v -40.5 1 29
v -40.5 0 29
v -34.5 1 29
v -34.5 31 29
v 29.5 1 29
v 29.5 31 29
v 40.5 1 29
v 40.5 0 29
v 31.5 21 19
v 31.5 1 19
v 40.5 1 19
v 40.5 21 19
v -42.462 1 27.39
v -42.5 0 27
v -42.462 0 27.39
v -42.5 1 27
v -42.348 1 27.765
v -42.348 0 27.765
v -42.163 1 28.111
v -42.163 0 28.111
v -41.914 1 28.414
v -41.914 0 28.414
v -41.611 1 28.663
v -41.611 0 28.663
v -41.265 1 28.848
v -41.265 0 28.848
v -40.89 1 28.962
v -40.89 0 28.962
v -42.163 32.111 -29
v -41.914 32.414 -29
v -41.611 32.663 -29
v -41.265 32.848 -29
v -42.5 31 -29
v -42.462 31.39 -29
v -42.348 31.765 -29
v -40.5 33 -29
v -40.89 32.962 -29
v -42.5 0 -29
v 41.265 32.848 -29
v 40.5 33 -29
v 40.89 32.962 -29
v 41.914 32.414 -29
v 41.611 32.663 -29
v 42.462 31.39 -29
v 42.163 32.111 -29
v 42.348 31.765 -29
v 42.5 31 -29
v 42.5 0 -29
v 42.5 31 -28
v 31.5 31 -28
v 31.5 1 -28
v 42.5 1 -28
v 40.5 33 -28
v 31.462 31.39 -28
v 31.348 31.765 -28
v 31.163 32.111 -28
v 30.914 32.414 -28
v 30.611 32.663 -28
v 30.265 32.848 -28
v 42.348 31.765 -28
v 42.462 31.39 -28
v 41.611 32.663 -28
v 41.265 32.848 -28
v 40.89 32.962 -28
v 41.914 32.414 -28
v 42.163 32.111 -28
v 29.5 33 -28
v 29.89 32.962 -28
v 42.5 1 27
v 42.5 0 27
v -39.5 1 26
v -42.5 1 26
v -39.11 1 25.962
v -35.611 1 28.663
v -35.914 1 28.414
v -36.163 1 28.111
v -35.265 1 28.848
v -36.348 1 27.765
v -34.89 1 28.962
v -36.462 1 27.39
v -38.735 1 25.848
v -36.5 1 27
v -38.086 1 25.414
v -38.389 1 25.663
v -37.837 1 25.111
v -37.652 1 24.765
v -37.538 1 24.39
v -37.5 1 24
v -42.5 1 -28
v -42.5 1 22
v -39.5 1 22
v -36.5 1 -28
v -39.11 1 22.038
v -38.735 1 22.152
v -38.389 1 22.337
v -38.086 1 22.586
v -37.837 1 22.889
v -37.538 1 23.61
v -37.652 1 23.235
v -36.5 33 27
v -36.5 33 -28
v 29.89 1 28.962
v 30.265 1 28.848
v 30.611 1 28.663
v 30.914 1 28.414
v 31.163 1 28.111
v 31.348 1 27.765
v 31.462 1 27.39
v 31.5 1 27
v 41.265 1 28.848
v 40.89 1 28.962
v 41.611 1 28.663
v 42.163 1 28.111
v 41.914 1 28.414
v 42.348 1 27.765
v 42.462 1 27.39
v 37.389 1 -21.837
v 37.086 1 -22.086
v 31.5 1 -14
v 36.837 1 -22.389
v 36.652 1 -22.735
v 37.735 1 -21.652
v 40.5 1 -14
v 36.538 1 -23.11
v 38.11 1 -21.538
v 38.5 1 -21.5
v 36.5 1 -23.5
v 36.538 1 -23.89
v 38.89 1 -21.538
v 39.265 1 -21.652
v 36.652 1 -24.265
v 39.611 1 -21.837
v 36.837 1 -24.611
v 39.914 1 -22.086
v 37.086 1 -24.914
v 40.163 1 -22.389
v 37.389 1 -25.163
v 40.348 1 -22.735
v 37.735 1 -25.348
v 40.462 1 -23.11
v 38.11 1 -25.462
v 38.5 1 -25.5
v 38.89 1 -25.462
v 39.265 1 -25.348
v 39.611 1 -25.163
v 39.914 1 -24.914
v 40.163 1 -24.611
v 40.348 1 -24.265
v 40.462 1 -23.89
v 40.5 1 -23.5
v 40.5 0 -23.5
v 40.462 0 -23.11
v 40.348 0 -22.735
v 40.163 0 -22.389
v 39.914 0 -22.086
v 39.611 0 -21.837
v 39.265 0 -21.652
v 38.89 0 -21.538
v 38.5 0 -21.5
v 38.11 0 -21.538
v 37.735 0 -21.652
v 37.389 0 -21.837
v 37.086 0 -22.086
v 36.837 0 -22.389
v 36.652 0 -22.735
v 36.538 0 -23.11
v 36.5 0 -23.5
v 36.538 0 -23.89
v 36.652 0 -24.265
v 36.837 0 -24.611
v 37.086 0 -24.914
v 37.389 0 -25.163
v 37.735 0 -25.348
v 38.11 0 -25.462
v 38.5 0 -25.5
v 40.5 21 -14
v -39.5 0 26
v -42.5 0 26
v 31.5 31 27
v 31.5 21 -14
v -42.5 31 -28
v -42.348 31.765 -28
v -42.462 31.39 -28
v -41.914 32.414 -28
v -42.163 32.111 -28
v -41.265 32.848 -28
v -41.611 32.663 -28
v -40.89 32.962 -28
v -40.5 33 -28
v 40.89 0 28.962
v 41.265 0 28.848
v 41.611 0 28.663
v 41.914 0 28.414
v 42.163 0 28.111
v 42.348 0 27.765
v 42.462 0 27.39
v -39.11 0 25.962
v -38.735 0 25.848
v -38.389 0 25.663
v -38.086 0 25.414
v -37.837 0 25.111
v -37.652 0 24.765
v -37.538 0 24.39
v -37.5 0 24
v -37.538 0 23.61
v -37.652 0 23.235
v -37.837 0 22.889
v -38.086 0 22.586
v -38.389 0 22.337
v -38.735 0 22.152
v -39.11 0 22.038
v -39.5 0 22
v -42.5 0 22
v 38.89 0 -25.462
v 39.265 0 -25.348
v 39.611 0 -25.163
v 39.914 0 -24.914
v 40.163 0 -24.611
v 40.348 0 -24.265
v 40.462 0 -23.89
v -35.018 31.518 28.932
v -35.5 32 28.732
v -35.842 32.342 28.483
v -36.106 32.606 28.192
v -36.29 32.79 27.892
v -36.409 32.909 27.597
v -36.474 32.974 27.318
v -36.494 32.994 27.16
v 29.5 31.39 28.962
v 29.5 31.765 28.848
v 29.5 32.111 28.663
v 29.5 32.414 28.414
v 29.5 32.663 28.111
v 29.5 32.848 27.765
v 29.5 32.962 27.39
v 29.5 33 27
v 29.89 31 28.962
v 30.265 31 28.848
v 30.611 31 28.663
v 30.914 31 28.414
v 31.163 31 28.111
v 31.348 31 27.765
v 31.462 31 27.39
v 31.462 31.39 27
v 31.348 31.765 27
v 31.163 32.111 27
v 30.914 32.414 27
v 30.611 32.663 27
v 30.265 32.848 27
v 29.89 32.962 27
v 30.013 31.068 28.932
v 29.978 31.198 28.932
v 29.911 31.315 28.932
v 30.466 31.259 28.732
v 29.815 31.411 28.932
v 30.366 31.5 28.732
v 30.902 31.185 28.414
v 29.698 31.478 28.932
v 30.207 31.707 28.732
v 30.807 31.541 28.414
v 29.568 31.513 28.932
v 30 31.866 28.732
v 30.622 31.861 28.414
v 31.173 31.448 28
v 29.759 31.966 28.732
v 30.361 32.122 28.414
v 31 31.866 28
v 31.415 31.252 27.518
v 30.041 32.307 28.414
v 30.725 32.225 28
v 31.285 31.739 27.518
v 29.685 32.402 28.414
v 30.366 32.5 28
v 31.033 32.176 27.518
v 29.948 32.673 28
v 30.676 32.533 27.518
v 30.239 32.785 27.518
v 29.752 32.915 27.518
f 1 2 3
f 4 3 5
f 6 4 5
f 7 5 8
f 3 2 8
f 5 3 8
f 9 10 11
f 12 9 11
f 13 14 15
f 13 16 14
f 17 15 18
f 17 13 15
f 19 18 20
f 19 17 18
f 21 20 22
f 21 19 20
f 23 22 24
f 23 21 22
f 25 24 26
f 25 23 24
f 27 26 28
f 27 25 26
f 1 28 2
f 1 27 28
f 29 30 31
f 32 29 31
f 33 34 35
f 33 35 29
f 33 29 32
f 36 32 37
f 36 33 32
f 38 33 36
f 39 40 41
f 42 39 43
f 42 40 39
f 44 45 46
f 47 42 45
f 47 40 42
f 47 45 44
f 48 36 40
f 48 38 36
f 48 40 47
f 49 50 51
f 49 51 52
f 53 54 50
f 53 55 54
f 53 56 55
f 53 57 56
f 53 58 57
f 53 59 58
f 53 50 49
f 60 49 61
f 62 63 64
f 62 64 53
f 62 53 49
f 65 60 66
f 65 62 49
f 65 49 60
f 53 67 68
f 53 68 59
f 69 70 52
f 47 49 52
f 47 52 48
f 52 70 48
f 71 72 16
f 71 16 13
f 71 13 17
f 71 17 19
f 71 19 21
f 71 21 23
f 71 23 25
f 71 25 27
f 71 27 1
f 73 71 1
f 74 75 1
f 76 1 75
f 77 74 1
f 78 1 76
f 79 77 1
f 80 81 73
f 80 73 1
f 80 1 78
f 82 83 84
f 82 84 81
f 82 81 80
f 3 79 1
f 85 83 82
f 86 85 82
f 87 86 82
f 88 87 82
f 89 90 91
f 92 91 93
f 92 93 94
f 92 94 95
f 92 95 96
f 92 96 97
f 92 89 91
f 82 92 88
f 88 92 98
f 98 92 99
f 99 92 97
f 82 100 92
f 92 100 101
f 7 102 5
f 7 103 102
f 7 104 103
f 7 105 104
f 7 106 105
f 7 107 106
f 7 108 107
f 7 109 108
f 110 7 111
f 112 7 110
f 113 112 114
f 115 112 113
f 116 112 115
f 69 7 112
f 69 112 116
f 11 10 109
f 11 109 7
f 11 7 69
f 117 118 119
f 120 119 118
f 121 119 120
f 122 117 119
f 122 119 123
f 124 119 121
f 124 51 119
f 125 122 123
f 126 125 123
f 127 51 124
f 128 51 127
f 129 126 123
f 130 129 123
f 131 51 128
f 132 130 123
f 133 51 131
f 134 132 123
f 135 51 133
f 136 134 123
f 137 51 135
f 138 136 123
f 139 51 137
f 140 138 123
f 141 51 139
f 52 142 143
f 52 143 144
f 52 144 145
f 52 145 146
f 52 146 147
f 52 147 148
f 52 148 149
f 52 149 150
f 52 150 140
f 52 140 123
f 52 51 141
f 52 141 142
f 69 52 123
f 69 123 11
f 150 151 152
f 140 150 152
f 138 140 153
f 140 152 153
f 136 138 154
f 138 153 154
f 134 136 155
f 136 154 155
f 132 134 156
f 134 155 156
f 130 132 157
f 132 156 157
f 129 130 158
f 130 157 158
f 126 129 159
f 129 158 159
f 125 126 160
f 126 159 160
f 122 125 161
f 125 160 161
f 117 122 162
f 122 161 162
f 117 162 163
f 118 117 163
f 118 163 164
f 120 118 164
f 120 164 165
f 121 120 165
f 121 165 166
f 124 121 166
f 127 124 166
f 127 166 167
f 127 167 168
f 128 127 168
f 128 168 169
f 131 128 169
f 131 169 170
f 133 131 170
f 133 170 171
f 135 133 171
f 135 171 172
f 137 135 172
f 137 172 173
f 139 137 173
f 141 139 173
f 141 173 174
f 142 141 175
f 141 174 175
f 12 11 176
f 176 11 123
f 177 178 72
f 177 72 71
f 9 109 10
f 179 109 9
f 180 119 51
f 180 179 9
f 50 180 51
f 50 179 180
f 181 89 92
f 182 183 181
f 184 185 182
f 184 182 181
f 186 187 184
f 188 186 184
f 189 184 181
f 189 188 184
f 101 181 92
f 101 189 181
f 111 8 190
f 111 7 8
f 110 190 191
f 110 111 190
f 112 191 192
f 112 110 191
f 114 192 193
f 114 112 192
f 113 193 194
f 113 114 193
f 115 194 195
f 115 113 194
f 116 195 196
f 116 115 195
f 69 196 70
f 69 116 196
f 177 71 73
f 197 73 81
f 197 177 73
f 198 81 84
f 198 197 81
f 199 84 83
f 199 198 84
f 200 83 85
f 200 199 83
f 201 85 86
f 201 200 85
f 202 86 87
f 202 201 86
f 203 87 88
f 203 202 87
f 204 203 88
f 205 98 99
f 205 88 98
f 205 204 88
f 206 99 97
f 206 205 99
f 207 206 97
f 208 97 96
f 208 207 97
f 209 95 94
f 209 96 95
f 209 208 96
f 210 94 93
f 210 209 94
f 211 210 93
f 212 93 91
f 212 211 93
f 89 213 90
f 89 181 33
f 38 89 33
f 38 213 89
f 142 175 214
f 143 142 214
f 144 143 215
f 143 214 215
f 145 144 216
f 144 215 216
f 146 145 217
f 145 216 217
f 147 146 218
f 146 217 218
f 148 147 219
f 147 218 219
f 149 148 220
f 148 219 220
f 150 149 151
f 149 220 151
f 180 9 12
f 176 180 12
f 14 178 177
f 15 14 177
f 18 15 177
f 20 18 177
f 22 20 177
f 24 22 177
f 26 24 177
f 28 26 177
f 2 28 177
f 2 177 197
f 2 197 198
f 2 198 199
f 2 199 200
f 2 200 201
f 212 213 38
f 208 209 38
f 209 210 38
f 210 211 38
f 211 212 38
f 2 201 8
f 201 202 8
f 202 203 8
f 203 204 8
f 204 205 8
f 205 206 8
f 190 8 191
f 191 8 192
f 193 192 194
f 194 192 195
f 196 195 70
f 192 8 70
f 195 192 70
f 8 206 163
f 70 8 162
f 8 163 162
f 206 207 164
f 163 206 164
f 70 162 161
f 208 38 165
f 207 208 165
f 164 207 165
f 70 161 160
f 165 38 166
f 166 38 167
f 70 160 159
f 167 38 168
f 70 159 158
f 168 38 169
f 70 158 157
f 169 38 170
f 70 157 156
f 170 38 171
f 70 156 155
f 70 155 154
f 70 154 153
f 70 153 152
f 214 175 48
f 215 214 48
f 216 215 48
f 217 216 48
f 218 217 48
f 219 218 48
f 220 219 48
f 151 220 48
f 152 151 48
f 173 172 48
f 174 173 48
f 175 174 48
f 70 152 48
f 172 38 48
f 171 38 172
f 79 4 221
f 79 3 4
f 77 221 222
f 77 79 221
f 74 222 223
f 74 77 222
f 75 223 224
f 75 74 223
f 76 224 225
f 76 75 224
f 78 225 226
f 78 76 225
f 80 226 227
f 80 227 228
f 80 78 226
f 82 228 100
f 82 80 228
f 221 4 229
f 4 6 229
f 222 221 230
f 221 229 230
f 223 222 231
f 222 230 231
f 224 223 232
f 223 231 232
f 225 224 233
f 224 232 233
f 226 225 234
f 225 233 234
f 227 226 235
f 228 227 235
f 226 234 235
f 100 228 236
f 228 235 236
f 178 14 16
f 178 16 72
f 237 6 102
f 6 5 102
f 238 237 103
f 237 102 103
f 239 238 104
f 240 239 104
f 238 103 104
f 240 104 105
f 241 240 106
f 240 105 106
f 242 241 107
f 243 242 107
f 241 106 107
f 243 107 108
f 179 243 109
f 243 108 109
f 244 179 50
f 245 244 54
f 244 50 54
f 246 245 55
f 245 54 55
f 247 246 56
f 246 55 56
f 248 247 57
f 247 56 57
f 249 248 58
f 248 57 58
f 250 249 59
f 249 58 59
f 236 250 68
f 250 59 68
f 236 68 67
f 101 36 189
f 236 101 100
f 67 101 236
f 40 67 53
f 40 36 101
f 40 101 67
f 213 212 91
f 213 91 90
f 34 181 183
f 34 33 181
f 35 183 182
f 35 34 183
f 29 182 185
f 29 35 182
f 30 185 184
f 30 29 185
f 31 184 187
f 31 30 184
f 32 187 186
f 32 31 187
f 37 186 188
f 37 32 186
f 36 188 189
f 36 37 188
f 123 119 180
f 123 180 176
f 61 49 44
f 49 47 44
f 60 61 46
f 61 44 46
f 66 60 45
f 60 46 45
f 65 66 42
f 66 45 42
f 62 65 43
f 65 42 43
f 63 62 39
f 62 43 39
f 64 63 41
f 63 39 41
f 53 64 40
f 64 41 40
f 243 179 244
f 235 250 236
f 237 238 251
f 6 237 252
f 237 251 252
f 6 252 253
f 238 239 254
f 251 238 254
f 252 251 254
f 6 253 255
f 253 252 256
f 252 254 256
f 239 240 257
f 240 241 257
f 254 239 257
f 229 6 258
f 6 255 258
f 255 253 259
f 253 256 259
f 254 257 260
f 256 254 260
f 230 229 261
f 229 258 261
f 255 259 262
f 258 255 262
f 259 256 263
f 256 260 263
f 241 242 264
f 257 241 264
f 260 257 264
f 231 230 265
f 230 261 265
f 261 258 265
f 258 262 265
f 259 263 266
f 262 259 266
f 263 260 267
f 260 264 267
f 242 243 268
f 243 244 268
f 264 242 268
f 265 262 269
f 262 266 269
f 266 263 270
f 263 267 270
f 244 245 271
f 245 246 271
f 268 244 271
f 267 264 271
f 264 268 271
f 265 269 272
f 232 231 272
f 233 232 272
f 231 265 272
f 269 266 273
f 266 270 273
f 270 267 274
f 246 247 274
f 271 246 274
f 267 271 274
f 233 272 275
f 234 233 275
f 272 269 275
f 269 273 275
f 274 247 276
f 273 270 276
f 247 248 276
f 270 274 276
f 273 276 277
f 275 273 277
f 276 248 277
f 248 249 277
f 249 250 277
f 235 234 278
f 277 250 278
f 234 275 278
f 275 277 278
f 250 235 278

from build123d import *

# Parameters (mm, degrees)
SKETCH1_W           = 85
SKETCH1_H           = 58
BOSS_EXTRUDE1_DEPTH = 33
SKETCH2_W           = 11
SKETCH2_H           = 57
CUT_EXTRUDE1_DEPTH  = 32
SKETCH3_W           = 6
SKETCH3_H           = 57
CUT_EXTRUDE2_DEPTH  = 32
SKETCH4_W           = 9
SKETCH4_H           = 33
BOSS_EXTRUDE2_DEPTH = 20
CUT_EXTRUDE3_REACH  = 63.125
FILLET1_R           = 2


with BuildPart() as part:
    # Sketch1 → Boss-Extrude1 (new body)
    with BuildSketch(Plane(origin=(0, 0, 0), x_dir=(1, 0, 0), z_dir=(0, 1, 0))):
        Rectangle(SKETCH1_W, SKETCH1_H)
    extrude(amount=BOSS_EXTRUDE1_DEPTH)

    # Sketch2 → Cut-Extrude1 (cut)
    with BuildSketch(Plane(origin=(0, 33, 0), x_dir=(1, 0, 0), z_dir=(0, 1, 0))):
        with Locations((37, -0.5)):
            Rectangle(SKETCH2_W, SKETCH2_H)
    extrude(amount=-CUT_EXTRUDE1_DEPTH, mode=Mode.SUBTRACT)

    # Sketch3 → Cut-Extrude2 (cut)
    with BuildSketch(Plane(origin=(0, 33, 0), x_dir=(1, 0, 0), z_dir=(0, 1, 0))):
        with Locations((-39.5, -0.5)):
            Rectangle(SKETCH3_W, SKETCH3_H)
    extrude(amount=-CUT_EXTRUDE2_DEPTH, mode=Mode.SUBTRACT)

    # Sketch4 → Boss-Extrude2 (add)
    with BuildSketch(Plane(origin=(0, 1, 0), x_dir=(1, 0, 0), z_dir=(0, 1, 0))):
        with Locations((36, -2.5)):
            Rectangle(SKETCH4_W, SKETCH4_H)
    extrude(amount=BOSS_EXTRUDE2_DEPTH)

    # Sketch5 → Cut-Extrude3 (cut, up to next)
    with BuildSketch(Plane.XZ, mode=Mode.PRIVATE) as cut_extrude3_sk1:
        with BuildLine():
            Line((38.5, -25.5), (38.5, -23.5))
            Line((38.5, -23.5), (40.5, -23.5))
            ThreePointArc((40.5, -23.5), (37.085786438, -22.085786438), (38.5, -25.5))
        make_face()
    cut_extrude3_tool1 = extrude(cut_extrude3_sk1.sketch, amount=-CUT_EXTRUDE3_REACH, mode=Mode.PRIVATE) & part.part
    # Sketch5 → Cut-Extrude3 (cut, up to next)
    with BuildSketch(Plane.XZ, mode=Mode.PRIVATE) as cut_extrude3_sk2:
        with BuildLine():
            Line((40.5, -23.5), (38.5, -23.5))
            Line((38.5, -23.5), (38.5, -25.5))
            ThreePointArc((38.5, -25.5), (39.914213562, -24.914213562), (40.5, -23.5))
        make_face()
    cut_extrude3_tool2 = extrude(cut_extrude3_sk2.sketch, amount=-CUT_EXTRUDE3_REACH, mode=Mode.PRIVATE) & part.part
    # Sketch5 → Cut-Extrude3 (cut, up to next)
    with BuildSketch(Plane.XZ, mode=Mode.PRIVATE) as cut_extrude3_sk3:
        with BuildLine():
            Line((38.5, -25.5), (38.5, -23.5))
            Line((38.5, -23.5), (40.5, -23.5))
            ThreePointArc((40.5, -23.5), (37.085786438, -22.085786438), (38.5, -25.5))
        make_face()
    cut_extrude3_tool3 = extrude(cut_extrude3_sk3.sketch, amount=-CUT_EXTRUDE3_REACH, mode=Mode.PRIVATE) & part.part
    # Sketch5 → Cut-Extrude3 (cut, up to next)
    with BuildSketch(Plane.XZ, mode=Mode.PRIVATE) as cut_extrude3_sk4:
        with BuildLine():
            Line((40.5, -23.5), (38.5, -23.5))
            Line((38.5, -23.5), (38.5, -25.5))
            ThreePointArc((38.5, -25.5), (39.914213562, -24.914213562), (40.5, -23.5))
        make_face()
    cut_extrude3_tool4 = extrude(cut_extrude3_sk4.sketch, amount=-CUT_EXTRUDE3_REACH, mode=Mode.PRIVATE) & part.part
    # Sketch5 → Cut-Extrude3 (cut, up to next)
    with BuildSketch(Plane.XZ, mode=Mode.PRIVATE) as cut_extrude3_sk5:
        with BuildLine():
            Line((-39.5, 22), (-42.5, 22))
            ThreePointArc((-42.5, 22), (-44.5, 24), (-42.5, 26))
            Line((-42.5, 26), (-39.5, 26))
            ThreePointArc((-39.5, 26), (-37.5, 24), (-39.5, 22))
        make_face()
    cut_extrude3_tool5 = extrude(cut_extrude3_sk5.sketch, amount=-CUT_EXTRUDE3_REACH, mode=Mode.PRIVATE) & part.part
    add(cut_extrude3_tool1.solids().sort_by_distance((38.217058, 0, -23.217058))[0], mode=Mode.SUBTRACT)
    add(cut_extrude3_tool2.solids().sort_by_distance((39.348826, 0, -24.348826))[0], mode=Mode.SUBTRACT)
    add(cut_extrude3_tool3.solids().sort_by_distance((38.217058, 0, -23.217058))[0], mode=Mode.SUBTRACT)
    add(cut_extrude3_tool4.solids().sort_by_distance((39.348826, 0, -24.348826))[0], mode=Mode.SUBTRACT)
    add(cut_extrude3_tool5.solids().sort_by_distance((-41, 0, 24))[0], mode=Mode.SUBTRACT)

    # Fillet1
    fillet1_edges = [part.edges().sort_by_distance(p)[0] for p in [
        (-42.5, 33, -28.5),
        (42.5, 33, -28.5),
        (42.5, 0.5, 29),
        (31.5, 33, 0.5),
        (31.5, 17, 29),
        (-2.5, 33, 29),
        (-42.5, 0.5, 29),
        (-36.5, 17, 29),
    ]]
    fillet(fillet1_edges, radius=FILLET1_R)


solid = part.part
